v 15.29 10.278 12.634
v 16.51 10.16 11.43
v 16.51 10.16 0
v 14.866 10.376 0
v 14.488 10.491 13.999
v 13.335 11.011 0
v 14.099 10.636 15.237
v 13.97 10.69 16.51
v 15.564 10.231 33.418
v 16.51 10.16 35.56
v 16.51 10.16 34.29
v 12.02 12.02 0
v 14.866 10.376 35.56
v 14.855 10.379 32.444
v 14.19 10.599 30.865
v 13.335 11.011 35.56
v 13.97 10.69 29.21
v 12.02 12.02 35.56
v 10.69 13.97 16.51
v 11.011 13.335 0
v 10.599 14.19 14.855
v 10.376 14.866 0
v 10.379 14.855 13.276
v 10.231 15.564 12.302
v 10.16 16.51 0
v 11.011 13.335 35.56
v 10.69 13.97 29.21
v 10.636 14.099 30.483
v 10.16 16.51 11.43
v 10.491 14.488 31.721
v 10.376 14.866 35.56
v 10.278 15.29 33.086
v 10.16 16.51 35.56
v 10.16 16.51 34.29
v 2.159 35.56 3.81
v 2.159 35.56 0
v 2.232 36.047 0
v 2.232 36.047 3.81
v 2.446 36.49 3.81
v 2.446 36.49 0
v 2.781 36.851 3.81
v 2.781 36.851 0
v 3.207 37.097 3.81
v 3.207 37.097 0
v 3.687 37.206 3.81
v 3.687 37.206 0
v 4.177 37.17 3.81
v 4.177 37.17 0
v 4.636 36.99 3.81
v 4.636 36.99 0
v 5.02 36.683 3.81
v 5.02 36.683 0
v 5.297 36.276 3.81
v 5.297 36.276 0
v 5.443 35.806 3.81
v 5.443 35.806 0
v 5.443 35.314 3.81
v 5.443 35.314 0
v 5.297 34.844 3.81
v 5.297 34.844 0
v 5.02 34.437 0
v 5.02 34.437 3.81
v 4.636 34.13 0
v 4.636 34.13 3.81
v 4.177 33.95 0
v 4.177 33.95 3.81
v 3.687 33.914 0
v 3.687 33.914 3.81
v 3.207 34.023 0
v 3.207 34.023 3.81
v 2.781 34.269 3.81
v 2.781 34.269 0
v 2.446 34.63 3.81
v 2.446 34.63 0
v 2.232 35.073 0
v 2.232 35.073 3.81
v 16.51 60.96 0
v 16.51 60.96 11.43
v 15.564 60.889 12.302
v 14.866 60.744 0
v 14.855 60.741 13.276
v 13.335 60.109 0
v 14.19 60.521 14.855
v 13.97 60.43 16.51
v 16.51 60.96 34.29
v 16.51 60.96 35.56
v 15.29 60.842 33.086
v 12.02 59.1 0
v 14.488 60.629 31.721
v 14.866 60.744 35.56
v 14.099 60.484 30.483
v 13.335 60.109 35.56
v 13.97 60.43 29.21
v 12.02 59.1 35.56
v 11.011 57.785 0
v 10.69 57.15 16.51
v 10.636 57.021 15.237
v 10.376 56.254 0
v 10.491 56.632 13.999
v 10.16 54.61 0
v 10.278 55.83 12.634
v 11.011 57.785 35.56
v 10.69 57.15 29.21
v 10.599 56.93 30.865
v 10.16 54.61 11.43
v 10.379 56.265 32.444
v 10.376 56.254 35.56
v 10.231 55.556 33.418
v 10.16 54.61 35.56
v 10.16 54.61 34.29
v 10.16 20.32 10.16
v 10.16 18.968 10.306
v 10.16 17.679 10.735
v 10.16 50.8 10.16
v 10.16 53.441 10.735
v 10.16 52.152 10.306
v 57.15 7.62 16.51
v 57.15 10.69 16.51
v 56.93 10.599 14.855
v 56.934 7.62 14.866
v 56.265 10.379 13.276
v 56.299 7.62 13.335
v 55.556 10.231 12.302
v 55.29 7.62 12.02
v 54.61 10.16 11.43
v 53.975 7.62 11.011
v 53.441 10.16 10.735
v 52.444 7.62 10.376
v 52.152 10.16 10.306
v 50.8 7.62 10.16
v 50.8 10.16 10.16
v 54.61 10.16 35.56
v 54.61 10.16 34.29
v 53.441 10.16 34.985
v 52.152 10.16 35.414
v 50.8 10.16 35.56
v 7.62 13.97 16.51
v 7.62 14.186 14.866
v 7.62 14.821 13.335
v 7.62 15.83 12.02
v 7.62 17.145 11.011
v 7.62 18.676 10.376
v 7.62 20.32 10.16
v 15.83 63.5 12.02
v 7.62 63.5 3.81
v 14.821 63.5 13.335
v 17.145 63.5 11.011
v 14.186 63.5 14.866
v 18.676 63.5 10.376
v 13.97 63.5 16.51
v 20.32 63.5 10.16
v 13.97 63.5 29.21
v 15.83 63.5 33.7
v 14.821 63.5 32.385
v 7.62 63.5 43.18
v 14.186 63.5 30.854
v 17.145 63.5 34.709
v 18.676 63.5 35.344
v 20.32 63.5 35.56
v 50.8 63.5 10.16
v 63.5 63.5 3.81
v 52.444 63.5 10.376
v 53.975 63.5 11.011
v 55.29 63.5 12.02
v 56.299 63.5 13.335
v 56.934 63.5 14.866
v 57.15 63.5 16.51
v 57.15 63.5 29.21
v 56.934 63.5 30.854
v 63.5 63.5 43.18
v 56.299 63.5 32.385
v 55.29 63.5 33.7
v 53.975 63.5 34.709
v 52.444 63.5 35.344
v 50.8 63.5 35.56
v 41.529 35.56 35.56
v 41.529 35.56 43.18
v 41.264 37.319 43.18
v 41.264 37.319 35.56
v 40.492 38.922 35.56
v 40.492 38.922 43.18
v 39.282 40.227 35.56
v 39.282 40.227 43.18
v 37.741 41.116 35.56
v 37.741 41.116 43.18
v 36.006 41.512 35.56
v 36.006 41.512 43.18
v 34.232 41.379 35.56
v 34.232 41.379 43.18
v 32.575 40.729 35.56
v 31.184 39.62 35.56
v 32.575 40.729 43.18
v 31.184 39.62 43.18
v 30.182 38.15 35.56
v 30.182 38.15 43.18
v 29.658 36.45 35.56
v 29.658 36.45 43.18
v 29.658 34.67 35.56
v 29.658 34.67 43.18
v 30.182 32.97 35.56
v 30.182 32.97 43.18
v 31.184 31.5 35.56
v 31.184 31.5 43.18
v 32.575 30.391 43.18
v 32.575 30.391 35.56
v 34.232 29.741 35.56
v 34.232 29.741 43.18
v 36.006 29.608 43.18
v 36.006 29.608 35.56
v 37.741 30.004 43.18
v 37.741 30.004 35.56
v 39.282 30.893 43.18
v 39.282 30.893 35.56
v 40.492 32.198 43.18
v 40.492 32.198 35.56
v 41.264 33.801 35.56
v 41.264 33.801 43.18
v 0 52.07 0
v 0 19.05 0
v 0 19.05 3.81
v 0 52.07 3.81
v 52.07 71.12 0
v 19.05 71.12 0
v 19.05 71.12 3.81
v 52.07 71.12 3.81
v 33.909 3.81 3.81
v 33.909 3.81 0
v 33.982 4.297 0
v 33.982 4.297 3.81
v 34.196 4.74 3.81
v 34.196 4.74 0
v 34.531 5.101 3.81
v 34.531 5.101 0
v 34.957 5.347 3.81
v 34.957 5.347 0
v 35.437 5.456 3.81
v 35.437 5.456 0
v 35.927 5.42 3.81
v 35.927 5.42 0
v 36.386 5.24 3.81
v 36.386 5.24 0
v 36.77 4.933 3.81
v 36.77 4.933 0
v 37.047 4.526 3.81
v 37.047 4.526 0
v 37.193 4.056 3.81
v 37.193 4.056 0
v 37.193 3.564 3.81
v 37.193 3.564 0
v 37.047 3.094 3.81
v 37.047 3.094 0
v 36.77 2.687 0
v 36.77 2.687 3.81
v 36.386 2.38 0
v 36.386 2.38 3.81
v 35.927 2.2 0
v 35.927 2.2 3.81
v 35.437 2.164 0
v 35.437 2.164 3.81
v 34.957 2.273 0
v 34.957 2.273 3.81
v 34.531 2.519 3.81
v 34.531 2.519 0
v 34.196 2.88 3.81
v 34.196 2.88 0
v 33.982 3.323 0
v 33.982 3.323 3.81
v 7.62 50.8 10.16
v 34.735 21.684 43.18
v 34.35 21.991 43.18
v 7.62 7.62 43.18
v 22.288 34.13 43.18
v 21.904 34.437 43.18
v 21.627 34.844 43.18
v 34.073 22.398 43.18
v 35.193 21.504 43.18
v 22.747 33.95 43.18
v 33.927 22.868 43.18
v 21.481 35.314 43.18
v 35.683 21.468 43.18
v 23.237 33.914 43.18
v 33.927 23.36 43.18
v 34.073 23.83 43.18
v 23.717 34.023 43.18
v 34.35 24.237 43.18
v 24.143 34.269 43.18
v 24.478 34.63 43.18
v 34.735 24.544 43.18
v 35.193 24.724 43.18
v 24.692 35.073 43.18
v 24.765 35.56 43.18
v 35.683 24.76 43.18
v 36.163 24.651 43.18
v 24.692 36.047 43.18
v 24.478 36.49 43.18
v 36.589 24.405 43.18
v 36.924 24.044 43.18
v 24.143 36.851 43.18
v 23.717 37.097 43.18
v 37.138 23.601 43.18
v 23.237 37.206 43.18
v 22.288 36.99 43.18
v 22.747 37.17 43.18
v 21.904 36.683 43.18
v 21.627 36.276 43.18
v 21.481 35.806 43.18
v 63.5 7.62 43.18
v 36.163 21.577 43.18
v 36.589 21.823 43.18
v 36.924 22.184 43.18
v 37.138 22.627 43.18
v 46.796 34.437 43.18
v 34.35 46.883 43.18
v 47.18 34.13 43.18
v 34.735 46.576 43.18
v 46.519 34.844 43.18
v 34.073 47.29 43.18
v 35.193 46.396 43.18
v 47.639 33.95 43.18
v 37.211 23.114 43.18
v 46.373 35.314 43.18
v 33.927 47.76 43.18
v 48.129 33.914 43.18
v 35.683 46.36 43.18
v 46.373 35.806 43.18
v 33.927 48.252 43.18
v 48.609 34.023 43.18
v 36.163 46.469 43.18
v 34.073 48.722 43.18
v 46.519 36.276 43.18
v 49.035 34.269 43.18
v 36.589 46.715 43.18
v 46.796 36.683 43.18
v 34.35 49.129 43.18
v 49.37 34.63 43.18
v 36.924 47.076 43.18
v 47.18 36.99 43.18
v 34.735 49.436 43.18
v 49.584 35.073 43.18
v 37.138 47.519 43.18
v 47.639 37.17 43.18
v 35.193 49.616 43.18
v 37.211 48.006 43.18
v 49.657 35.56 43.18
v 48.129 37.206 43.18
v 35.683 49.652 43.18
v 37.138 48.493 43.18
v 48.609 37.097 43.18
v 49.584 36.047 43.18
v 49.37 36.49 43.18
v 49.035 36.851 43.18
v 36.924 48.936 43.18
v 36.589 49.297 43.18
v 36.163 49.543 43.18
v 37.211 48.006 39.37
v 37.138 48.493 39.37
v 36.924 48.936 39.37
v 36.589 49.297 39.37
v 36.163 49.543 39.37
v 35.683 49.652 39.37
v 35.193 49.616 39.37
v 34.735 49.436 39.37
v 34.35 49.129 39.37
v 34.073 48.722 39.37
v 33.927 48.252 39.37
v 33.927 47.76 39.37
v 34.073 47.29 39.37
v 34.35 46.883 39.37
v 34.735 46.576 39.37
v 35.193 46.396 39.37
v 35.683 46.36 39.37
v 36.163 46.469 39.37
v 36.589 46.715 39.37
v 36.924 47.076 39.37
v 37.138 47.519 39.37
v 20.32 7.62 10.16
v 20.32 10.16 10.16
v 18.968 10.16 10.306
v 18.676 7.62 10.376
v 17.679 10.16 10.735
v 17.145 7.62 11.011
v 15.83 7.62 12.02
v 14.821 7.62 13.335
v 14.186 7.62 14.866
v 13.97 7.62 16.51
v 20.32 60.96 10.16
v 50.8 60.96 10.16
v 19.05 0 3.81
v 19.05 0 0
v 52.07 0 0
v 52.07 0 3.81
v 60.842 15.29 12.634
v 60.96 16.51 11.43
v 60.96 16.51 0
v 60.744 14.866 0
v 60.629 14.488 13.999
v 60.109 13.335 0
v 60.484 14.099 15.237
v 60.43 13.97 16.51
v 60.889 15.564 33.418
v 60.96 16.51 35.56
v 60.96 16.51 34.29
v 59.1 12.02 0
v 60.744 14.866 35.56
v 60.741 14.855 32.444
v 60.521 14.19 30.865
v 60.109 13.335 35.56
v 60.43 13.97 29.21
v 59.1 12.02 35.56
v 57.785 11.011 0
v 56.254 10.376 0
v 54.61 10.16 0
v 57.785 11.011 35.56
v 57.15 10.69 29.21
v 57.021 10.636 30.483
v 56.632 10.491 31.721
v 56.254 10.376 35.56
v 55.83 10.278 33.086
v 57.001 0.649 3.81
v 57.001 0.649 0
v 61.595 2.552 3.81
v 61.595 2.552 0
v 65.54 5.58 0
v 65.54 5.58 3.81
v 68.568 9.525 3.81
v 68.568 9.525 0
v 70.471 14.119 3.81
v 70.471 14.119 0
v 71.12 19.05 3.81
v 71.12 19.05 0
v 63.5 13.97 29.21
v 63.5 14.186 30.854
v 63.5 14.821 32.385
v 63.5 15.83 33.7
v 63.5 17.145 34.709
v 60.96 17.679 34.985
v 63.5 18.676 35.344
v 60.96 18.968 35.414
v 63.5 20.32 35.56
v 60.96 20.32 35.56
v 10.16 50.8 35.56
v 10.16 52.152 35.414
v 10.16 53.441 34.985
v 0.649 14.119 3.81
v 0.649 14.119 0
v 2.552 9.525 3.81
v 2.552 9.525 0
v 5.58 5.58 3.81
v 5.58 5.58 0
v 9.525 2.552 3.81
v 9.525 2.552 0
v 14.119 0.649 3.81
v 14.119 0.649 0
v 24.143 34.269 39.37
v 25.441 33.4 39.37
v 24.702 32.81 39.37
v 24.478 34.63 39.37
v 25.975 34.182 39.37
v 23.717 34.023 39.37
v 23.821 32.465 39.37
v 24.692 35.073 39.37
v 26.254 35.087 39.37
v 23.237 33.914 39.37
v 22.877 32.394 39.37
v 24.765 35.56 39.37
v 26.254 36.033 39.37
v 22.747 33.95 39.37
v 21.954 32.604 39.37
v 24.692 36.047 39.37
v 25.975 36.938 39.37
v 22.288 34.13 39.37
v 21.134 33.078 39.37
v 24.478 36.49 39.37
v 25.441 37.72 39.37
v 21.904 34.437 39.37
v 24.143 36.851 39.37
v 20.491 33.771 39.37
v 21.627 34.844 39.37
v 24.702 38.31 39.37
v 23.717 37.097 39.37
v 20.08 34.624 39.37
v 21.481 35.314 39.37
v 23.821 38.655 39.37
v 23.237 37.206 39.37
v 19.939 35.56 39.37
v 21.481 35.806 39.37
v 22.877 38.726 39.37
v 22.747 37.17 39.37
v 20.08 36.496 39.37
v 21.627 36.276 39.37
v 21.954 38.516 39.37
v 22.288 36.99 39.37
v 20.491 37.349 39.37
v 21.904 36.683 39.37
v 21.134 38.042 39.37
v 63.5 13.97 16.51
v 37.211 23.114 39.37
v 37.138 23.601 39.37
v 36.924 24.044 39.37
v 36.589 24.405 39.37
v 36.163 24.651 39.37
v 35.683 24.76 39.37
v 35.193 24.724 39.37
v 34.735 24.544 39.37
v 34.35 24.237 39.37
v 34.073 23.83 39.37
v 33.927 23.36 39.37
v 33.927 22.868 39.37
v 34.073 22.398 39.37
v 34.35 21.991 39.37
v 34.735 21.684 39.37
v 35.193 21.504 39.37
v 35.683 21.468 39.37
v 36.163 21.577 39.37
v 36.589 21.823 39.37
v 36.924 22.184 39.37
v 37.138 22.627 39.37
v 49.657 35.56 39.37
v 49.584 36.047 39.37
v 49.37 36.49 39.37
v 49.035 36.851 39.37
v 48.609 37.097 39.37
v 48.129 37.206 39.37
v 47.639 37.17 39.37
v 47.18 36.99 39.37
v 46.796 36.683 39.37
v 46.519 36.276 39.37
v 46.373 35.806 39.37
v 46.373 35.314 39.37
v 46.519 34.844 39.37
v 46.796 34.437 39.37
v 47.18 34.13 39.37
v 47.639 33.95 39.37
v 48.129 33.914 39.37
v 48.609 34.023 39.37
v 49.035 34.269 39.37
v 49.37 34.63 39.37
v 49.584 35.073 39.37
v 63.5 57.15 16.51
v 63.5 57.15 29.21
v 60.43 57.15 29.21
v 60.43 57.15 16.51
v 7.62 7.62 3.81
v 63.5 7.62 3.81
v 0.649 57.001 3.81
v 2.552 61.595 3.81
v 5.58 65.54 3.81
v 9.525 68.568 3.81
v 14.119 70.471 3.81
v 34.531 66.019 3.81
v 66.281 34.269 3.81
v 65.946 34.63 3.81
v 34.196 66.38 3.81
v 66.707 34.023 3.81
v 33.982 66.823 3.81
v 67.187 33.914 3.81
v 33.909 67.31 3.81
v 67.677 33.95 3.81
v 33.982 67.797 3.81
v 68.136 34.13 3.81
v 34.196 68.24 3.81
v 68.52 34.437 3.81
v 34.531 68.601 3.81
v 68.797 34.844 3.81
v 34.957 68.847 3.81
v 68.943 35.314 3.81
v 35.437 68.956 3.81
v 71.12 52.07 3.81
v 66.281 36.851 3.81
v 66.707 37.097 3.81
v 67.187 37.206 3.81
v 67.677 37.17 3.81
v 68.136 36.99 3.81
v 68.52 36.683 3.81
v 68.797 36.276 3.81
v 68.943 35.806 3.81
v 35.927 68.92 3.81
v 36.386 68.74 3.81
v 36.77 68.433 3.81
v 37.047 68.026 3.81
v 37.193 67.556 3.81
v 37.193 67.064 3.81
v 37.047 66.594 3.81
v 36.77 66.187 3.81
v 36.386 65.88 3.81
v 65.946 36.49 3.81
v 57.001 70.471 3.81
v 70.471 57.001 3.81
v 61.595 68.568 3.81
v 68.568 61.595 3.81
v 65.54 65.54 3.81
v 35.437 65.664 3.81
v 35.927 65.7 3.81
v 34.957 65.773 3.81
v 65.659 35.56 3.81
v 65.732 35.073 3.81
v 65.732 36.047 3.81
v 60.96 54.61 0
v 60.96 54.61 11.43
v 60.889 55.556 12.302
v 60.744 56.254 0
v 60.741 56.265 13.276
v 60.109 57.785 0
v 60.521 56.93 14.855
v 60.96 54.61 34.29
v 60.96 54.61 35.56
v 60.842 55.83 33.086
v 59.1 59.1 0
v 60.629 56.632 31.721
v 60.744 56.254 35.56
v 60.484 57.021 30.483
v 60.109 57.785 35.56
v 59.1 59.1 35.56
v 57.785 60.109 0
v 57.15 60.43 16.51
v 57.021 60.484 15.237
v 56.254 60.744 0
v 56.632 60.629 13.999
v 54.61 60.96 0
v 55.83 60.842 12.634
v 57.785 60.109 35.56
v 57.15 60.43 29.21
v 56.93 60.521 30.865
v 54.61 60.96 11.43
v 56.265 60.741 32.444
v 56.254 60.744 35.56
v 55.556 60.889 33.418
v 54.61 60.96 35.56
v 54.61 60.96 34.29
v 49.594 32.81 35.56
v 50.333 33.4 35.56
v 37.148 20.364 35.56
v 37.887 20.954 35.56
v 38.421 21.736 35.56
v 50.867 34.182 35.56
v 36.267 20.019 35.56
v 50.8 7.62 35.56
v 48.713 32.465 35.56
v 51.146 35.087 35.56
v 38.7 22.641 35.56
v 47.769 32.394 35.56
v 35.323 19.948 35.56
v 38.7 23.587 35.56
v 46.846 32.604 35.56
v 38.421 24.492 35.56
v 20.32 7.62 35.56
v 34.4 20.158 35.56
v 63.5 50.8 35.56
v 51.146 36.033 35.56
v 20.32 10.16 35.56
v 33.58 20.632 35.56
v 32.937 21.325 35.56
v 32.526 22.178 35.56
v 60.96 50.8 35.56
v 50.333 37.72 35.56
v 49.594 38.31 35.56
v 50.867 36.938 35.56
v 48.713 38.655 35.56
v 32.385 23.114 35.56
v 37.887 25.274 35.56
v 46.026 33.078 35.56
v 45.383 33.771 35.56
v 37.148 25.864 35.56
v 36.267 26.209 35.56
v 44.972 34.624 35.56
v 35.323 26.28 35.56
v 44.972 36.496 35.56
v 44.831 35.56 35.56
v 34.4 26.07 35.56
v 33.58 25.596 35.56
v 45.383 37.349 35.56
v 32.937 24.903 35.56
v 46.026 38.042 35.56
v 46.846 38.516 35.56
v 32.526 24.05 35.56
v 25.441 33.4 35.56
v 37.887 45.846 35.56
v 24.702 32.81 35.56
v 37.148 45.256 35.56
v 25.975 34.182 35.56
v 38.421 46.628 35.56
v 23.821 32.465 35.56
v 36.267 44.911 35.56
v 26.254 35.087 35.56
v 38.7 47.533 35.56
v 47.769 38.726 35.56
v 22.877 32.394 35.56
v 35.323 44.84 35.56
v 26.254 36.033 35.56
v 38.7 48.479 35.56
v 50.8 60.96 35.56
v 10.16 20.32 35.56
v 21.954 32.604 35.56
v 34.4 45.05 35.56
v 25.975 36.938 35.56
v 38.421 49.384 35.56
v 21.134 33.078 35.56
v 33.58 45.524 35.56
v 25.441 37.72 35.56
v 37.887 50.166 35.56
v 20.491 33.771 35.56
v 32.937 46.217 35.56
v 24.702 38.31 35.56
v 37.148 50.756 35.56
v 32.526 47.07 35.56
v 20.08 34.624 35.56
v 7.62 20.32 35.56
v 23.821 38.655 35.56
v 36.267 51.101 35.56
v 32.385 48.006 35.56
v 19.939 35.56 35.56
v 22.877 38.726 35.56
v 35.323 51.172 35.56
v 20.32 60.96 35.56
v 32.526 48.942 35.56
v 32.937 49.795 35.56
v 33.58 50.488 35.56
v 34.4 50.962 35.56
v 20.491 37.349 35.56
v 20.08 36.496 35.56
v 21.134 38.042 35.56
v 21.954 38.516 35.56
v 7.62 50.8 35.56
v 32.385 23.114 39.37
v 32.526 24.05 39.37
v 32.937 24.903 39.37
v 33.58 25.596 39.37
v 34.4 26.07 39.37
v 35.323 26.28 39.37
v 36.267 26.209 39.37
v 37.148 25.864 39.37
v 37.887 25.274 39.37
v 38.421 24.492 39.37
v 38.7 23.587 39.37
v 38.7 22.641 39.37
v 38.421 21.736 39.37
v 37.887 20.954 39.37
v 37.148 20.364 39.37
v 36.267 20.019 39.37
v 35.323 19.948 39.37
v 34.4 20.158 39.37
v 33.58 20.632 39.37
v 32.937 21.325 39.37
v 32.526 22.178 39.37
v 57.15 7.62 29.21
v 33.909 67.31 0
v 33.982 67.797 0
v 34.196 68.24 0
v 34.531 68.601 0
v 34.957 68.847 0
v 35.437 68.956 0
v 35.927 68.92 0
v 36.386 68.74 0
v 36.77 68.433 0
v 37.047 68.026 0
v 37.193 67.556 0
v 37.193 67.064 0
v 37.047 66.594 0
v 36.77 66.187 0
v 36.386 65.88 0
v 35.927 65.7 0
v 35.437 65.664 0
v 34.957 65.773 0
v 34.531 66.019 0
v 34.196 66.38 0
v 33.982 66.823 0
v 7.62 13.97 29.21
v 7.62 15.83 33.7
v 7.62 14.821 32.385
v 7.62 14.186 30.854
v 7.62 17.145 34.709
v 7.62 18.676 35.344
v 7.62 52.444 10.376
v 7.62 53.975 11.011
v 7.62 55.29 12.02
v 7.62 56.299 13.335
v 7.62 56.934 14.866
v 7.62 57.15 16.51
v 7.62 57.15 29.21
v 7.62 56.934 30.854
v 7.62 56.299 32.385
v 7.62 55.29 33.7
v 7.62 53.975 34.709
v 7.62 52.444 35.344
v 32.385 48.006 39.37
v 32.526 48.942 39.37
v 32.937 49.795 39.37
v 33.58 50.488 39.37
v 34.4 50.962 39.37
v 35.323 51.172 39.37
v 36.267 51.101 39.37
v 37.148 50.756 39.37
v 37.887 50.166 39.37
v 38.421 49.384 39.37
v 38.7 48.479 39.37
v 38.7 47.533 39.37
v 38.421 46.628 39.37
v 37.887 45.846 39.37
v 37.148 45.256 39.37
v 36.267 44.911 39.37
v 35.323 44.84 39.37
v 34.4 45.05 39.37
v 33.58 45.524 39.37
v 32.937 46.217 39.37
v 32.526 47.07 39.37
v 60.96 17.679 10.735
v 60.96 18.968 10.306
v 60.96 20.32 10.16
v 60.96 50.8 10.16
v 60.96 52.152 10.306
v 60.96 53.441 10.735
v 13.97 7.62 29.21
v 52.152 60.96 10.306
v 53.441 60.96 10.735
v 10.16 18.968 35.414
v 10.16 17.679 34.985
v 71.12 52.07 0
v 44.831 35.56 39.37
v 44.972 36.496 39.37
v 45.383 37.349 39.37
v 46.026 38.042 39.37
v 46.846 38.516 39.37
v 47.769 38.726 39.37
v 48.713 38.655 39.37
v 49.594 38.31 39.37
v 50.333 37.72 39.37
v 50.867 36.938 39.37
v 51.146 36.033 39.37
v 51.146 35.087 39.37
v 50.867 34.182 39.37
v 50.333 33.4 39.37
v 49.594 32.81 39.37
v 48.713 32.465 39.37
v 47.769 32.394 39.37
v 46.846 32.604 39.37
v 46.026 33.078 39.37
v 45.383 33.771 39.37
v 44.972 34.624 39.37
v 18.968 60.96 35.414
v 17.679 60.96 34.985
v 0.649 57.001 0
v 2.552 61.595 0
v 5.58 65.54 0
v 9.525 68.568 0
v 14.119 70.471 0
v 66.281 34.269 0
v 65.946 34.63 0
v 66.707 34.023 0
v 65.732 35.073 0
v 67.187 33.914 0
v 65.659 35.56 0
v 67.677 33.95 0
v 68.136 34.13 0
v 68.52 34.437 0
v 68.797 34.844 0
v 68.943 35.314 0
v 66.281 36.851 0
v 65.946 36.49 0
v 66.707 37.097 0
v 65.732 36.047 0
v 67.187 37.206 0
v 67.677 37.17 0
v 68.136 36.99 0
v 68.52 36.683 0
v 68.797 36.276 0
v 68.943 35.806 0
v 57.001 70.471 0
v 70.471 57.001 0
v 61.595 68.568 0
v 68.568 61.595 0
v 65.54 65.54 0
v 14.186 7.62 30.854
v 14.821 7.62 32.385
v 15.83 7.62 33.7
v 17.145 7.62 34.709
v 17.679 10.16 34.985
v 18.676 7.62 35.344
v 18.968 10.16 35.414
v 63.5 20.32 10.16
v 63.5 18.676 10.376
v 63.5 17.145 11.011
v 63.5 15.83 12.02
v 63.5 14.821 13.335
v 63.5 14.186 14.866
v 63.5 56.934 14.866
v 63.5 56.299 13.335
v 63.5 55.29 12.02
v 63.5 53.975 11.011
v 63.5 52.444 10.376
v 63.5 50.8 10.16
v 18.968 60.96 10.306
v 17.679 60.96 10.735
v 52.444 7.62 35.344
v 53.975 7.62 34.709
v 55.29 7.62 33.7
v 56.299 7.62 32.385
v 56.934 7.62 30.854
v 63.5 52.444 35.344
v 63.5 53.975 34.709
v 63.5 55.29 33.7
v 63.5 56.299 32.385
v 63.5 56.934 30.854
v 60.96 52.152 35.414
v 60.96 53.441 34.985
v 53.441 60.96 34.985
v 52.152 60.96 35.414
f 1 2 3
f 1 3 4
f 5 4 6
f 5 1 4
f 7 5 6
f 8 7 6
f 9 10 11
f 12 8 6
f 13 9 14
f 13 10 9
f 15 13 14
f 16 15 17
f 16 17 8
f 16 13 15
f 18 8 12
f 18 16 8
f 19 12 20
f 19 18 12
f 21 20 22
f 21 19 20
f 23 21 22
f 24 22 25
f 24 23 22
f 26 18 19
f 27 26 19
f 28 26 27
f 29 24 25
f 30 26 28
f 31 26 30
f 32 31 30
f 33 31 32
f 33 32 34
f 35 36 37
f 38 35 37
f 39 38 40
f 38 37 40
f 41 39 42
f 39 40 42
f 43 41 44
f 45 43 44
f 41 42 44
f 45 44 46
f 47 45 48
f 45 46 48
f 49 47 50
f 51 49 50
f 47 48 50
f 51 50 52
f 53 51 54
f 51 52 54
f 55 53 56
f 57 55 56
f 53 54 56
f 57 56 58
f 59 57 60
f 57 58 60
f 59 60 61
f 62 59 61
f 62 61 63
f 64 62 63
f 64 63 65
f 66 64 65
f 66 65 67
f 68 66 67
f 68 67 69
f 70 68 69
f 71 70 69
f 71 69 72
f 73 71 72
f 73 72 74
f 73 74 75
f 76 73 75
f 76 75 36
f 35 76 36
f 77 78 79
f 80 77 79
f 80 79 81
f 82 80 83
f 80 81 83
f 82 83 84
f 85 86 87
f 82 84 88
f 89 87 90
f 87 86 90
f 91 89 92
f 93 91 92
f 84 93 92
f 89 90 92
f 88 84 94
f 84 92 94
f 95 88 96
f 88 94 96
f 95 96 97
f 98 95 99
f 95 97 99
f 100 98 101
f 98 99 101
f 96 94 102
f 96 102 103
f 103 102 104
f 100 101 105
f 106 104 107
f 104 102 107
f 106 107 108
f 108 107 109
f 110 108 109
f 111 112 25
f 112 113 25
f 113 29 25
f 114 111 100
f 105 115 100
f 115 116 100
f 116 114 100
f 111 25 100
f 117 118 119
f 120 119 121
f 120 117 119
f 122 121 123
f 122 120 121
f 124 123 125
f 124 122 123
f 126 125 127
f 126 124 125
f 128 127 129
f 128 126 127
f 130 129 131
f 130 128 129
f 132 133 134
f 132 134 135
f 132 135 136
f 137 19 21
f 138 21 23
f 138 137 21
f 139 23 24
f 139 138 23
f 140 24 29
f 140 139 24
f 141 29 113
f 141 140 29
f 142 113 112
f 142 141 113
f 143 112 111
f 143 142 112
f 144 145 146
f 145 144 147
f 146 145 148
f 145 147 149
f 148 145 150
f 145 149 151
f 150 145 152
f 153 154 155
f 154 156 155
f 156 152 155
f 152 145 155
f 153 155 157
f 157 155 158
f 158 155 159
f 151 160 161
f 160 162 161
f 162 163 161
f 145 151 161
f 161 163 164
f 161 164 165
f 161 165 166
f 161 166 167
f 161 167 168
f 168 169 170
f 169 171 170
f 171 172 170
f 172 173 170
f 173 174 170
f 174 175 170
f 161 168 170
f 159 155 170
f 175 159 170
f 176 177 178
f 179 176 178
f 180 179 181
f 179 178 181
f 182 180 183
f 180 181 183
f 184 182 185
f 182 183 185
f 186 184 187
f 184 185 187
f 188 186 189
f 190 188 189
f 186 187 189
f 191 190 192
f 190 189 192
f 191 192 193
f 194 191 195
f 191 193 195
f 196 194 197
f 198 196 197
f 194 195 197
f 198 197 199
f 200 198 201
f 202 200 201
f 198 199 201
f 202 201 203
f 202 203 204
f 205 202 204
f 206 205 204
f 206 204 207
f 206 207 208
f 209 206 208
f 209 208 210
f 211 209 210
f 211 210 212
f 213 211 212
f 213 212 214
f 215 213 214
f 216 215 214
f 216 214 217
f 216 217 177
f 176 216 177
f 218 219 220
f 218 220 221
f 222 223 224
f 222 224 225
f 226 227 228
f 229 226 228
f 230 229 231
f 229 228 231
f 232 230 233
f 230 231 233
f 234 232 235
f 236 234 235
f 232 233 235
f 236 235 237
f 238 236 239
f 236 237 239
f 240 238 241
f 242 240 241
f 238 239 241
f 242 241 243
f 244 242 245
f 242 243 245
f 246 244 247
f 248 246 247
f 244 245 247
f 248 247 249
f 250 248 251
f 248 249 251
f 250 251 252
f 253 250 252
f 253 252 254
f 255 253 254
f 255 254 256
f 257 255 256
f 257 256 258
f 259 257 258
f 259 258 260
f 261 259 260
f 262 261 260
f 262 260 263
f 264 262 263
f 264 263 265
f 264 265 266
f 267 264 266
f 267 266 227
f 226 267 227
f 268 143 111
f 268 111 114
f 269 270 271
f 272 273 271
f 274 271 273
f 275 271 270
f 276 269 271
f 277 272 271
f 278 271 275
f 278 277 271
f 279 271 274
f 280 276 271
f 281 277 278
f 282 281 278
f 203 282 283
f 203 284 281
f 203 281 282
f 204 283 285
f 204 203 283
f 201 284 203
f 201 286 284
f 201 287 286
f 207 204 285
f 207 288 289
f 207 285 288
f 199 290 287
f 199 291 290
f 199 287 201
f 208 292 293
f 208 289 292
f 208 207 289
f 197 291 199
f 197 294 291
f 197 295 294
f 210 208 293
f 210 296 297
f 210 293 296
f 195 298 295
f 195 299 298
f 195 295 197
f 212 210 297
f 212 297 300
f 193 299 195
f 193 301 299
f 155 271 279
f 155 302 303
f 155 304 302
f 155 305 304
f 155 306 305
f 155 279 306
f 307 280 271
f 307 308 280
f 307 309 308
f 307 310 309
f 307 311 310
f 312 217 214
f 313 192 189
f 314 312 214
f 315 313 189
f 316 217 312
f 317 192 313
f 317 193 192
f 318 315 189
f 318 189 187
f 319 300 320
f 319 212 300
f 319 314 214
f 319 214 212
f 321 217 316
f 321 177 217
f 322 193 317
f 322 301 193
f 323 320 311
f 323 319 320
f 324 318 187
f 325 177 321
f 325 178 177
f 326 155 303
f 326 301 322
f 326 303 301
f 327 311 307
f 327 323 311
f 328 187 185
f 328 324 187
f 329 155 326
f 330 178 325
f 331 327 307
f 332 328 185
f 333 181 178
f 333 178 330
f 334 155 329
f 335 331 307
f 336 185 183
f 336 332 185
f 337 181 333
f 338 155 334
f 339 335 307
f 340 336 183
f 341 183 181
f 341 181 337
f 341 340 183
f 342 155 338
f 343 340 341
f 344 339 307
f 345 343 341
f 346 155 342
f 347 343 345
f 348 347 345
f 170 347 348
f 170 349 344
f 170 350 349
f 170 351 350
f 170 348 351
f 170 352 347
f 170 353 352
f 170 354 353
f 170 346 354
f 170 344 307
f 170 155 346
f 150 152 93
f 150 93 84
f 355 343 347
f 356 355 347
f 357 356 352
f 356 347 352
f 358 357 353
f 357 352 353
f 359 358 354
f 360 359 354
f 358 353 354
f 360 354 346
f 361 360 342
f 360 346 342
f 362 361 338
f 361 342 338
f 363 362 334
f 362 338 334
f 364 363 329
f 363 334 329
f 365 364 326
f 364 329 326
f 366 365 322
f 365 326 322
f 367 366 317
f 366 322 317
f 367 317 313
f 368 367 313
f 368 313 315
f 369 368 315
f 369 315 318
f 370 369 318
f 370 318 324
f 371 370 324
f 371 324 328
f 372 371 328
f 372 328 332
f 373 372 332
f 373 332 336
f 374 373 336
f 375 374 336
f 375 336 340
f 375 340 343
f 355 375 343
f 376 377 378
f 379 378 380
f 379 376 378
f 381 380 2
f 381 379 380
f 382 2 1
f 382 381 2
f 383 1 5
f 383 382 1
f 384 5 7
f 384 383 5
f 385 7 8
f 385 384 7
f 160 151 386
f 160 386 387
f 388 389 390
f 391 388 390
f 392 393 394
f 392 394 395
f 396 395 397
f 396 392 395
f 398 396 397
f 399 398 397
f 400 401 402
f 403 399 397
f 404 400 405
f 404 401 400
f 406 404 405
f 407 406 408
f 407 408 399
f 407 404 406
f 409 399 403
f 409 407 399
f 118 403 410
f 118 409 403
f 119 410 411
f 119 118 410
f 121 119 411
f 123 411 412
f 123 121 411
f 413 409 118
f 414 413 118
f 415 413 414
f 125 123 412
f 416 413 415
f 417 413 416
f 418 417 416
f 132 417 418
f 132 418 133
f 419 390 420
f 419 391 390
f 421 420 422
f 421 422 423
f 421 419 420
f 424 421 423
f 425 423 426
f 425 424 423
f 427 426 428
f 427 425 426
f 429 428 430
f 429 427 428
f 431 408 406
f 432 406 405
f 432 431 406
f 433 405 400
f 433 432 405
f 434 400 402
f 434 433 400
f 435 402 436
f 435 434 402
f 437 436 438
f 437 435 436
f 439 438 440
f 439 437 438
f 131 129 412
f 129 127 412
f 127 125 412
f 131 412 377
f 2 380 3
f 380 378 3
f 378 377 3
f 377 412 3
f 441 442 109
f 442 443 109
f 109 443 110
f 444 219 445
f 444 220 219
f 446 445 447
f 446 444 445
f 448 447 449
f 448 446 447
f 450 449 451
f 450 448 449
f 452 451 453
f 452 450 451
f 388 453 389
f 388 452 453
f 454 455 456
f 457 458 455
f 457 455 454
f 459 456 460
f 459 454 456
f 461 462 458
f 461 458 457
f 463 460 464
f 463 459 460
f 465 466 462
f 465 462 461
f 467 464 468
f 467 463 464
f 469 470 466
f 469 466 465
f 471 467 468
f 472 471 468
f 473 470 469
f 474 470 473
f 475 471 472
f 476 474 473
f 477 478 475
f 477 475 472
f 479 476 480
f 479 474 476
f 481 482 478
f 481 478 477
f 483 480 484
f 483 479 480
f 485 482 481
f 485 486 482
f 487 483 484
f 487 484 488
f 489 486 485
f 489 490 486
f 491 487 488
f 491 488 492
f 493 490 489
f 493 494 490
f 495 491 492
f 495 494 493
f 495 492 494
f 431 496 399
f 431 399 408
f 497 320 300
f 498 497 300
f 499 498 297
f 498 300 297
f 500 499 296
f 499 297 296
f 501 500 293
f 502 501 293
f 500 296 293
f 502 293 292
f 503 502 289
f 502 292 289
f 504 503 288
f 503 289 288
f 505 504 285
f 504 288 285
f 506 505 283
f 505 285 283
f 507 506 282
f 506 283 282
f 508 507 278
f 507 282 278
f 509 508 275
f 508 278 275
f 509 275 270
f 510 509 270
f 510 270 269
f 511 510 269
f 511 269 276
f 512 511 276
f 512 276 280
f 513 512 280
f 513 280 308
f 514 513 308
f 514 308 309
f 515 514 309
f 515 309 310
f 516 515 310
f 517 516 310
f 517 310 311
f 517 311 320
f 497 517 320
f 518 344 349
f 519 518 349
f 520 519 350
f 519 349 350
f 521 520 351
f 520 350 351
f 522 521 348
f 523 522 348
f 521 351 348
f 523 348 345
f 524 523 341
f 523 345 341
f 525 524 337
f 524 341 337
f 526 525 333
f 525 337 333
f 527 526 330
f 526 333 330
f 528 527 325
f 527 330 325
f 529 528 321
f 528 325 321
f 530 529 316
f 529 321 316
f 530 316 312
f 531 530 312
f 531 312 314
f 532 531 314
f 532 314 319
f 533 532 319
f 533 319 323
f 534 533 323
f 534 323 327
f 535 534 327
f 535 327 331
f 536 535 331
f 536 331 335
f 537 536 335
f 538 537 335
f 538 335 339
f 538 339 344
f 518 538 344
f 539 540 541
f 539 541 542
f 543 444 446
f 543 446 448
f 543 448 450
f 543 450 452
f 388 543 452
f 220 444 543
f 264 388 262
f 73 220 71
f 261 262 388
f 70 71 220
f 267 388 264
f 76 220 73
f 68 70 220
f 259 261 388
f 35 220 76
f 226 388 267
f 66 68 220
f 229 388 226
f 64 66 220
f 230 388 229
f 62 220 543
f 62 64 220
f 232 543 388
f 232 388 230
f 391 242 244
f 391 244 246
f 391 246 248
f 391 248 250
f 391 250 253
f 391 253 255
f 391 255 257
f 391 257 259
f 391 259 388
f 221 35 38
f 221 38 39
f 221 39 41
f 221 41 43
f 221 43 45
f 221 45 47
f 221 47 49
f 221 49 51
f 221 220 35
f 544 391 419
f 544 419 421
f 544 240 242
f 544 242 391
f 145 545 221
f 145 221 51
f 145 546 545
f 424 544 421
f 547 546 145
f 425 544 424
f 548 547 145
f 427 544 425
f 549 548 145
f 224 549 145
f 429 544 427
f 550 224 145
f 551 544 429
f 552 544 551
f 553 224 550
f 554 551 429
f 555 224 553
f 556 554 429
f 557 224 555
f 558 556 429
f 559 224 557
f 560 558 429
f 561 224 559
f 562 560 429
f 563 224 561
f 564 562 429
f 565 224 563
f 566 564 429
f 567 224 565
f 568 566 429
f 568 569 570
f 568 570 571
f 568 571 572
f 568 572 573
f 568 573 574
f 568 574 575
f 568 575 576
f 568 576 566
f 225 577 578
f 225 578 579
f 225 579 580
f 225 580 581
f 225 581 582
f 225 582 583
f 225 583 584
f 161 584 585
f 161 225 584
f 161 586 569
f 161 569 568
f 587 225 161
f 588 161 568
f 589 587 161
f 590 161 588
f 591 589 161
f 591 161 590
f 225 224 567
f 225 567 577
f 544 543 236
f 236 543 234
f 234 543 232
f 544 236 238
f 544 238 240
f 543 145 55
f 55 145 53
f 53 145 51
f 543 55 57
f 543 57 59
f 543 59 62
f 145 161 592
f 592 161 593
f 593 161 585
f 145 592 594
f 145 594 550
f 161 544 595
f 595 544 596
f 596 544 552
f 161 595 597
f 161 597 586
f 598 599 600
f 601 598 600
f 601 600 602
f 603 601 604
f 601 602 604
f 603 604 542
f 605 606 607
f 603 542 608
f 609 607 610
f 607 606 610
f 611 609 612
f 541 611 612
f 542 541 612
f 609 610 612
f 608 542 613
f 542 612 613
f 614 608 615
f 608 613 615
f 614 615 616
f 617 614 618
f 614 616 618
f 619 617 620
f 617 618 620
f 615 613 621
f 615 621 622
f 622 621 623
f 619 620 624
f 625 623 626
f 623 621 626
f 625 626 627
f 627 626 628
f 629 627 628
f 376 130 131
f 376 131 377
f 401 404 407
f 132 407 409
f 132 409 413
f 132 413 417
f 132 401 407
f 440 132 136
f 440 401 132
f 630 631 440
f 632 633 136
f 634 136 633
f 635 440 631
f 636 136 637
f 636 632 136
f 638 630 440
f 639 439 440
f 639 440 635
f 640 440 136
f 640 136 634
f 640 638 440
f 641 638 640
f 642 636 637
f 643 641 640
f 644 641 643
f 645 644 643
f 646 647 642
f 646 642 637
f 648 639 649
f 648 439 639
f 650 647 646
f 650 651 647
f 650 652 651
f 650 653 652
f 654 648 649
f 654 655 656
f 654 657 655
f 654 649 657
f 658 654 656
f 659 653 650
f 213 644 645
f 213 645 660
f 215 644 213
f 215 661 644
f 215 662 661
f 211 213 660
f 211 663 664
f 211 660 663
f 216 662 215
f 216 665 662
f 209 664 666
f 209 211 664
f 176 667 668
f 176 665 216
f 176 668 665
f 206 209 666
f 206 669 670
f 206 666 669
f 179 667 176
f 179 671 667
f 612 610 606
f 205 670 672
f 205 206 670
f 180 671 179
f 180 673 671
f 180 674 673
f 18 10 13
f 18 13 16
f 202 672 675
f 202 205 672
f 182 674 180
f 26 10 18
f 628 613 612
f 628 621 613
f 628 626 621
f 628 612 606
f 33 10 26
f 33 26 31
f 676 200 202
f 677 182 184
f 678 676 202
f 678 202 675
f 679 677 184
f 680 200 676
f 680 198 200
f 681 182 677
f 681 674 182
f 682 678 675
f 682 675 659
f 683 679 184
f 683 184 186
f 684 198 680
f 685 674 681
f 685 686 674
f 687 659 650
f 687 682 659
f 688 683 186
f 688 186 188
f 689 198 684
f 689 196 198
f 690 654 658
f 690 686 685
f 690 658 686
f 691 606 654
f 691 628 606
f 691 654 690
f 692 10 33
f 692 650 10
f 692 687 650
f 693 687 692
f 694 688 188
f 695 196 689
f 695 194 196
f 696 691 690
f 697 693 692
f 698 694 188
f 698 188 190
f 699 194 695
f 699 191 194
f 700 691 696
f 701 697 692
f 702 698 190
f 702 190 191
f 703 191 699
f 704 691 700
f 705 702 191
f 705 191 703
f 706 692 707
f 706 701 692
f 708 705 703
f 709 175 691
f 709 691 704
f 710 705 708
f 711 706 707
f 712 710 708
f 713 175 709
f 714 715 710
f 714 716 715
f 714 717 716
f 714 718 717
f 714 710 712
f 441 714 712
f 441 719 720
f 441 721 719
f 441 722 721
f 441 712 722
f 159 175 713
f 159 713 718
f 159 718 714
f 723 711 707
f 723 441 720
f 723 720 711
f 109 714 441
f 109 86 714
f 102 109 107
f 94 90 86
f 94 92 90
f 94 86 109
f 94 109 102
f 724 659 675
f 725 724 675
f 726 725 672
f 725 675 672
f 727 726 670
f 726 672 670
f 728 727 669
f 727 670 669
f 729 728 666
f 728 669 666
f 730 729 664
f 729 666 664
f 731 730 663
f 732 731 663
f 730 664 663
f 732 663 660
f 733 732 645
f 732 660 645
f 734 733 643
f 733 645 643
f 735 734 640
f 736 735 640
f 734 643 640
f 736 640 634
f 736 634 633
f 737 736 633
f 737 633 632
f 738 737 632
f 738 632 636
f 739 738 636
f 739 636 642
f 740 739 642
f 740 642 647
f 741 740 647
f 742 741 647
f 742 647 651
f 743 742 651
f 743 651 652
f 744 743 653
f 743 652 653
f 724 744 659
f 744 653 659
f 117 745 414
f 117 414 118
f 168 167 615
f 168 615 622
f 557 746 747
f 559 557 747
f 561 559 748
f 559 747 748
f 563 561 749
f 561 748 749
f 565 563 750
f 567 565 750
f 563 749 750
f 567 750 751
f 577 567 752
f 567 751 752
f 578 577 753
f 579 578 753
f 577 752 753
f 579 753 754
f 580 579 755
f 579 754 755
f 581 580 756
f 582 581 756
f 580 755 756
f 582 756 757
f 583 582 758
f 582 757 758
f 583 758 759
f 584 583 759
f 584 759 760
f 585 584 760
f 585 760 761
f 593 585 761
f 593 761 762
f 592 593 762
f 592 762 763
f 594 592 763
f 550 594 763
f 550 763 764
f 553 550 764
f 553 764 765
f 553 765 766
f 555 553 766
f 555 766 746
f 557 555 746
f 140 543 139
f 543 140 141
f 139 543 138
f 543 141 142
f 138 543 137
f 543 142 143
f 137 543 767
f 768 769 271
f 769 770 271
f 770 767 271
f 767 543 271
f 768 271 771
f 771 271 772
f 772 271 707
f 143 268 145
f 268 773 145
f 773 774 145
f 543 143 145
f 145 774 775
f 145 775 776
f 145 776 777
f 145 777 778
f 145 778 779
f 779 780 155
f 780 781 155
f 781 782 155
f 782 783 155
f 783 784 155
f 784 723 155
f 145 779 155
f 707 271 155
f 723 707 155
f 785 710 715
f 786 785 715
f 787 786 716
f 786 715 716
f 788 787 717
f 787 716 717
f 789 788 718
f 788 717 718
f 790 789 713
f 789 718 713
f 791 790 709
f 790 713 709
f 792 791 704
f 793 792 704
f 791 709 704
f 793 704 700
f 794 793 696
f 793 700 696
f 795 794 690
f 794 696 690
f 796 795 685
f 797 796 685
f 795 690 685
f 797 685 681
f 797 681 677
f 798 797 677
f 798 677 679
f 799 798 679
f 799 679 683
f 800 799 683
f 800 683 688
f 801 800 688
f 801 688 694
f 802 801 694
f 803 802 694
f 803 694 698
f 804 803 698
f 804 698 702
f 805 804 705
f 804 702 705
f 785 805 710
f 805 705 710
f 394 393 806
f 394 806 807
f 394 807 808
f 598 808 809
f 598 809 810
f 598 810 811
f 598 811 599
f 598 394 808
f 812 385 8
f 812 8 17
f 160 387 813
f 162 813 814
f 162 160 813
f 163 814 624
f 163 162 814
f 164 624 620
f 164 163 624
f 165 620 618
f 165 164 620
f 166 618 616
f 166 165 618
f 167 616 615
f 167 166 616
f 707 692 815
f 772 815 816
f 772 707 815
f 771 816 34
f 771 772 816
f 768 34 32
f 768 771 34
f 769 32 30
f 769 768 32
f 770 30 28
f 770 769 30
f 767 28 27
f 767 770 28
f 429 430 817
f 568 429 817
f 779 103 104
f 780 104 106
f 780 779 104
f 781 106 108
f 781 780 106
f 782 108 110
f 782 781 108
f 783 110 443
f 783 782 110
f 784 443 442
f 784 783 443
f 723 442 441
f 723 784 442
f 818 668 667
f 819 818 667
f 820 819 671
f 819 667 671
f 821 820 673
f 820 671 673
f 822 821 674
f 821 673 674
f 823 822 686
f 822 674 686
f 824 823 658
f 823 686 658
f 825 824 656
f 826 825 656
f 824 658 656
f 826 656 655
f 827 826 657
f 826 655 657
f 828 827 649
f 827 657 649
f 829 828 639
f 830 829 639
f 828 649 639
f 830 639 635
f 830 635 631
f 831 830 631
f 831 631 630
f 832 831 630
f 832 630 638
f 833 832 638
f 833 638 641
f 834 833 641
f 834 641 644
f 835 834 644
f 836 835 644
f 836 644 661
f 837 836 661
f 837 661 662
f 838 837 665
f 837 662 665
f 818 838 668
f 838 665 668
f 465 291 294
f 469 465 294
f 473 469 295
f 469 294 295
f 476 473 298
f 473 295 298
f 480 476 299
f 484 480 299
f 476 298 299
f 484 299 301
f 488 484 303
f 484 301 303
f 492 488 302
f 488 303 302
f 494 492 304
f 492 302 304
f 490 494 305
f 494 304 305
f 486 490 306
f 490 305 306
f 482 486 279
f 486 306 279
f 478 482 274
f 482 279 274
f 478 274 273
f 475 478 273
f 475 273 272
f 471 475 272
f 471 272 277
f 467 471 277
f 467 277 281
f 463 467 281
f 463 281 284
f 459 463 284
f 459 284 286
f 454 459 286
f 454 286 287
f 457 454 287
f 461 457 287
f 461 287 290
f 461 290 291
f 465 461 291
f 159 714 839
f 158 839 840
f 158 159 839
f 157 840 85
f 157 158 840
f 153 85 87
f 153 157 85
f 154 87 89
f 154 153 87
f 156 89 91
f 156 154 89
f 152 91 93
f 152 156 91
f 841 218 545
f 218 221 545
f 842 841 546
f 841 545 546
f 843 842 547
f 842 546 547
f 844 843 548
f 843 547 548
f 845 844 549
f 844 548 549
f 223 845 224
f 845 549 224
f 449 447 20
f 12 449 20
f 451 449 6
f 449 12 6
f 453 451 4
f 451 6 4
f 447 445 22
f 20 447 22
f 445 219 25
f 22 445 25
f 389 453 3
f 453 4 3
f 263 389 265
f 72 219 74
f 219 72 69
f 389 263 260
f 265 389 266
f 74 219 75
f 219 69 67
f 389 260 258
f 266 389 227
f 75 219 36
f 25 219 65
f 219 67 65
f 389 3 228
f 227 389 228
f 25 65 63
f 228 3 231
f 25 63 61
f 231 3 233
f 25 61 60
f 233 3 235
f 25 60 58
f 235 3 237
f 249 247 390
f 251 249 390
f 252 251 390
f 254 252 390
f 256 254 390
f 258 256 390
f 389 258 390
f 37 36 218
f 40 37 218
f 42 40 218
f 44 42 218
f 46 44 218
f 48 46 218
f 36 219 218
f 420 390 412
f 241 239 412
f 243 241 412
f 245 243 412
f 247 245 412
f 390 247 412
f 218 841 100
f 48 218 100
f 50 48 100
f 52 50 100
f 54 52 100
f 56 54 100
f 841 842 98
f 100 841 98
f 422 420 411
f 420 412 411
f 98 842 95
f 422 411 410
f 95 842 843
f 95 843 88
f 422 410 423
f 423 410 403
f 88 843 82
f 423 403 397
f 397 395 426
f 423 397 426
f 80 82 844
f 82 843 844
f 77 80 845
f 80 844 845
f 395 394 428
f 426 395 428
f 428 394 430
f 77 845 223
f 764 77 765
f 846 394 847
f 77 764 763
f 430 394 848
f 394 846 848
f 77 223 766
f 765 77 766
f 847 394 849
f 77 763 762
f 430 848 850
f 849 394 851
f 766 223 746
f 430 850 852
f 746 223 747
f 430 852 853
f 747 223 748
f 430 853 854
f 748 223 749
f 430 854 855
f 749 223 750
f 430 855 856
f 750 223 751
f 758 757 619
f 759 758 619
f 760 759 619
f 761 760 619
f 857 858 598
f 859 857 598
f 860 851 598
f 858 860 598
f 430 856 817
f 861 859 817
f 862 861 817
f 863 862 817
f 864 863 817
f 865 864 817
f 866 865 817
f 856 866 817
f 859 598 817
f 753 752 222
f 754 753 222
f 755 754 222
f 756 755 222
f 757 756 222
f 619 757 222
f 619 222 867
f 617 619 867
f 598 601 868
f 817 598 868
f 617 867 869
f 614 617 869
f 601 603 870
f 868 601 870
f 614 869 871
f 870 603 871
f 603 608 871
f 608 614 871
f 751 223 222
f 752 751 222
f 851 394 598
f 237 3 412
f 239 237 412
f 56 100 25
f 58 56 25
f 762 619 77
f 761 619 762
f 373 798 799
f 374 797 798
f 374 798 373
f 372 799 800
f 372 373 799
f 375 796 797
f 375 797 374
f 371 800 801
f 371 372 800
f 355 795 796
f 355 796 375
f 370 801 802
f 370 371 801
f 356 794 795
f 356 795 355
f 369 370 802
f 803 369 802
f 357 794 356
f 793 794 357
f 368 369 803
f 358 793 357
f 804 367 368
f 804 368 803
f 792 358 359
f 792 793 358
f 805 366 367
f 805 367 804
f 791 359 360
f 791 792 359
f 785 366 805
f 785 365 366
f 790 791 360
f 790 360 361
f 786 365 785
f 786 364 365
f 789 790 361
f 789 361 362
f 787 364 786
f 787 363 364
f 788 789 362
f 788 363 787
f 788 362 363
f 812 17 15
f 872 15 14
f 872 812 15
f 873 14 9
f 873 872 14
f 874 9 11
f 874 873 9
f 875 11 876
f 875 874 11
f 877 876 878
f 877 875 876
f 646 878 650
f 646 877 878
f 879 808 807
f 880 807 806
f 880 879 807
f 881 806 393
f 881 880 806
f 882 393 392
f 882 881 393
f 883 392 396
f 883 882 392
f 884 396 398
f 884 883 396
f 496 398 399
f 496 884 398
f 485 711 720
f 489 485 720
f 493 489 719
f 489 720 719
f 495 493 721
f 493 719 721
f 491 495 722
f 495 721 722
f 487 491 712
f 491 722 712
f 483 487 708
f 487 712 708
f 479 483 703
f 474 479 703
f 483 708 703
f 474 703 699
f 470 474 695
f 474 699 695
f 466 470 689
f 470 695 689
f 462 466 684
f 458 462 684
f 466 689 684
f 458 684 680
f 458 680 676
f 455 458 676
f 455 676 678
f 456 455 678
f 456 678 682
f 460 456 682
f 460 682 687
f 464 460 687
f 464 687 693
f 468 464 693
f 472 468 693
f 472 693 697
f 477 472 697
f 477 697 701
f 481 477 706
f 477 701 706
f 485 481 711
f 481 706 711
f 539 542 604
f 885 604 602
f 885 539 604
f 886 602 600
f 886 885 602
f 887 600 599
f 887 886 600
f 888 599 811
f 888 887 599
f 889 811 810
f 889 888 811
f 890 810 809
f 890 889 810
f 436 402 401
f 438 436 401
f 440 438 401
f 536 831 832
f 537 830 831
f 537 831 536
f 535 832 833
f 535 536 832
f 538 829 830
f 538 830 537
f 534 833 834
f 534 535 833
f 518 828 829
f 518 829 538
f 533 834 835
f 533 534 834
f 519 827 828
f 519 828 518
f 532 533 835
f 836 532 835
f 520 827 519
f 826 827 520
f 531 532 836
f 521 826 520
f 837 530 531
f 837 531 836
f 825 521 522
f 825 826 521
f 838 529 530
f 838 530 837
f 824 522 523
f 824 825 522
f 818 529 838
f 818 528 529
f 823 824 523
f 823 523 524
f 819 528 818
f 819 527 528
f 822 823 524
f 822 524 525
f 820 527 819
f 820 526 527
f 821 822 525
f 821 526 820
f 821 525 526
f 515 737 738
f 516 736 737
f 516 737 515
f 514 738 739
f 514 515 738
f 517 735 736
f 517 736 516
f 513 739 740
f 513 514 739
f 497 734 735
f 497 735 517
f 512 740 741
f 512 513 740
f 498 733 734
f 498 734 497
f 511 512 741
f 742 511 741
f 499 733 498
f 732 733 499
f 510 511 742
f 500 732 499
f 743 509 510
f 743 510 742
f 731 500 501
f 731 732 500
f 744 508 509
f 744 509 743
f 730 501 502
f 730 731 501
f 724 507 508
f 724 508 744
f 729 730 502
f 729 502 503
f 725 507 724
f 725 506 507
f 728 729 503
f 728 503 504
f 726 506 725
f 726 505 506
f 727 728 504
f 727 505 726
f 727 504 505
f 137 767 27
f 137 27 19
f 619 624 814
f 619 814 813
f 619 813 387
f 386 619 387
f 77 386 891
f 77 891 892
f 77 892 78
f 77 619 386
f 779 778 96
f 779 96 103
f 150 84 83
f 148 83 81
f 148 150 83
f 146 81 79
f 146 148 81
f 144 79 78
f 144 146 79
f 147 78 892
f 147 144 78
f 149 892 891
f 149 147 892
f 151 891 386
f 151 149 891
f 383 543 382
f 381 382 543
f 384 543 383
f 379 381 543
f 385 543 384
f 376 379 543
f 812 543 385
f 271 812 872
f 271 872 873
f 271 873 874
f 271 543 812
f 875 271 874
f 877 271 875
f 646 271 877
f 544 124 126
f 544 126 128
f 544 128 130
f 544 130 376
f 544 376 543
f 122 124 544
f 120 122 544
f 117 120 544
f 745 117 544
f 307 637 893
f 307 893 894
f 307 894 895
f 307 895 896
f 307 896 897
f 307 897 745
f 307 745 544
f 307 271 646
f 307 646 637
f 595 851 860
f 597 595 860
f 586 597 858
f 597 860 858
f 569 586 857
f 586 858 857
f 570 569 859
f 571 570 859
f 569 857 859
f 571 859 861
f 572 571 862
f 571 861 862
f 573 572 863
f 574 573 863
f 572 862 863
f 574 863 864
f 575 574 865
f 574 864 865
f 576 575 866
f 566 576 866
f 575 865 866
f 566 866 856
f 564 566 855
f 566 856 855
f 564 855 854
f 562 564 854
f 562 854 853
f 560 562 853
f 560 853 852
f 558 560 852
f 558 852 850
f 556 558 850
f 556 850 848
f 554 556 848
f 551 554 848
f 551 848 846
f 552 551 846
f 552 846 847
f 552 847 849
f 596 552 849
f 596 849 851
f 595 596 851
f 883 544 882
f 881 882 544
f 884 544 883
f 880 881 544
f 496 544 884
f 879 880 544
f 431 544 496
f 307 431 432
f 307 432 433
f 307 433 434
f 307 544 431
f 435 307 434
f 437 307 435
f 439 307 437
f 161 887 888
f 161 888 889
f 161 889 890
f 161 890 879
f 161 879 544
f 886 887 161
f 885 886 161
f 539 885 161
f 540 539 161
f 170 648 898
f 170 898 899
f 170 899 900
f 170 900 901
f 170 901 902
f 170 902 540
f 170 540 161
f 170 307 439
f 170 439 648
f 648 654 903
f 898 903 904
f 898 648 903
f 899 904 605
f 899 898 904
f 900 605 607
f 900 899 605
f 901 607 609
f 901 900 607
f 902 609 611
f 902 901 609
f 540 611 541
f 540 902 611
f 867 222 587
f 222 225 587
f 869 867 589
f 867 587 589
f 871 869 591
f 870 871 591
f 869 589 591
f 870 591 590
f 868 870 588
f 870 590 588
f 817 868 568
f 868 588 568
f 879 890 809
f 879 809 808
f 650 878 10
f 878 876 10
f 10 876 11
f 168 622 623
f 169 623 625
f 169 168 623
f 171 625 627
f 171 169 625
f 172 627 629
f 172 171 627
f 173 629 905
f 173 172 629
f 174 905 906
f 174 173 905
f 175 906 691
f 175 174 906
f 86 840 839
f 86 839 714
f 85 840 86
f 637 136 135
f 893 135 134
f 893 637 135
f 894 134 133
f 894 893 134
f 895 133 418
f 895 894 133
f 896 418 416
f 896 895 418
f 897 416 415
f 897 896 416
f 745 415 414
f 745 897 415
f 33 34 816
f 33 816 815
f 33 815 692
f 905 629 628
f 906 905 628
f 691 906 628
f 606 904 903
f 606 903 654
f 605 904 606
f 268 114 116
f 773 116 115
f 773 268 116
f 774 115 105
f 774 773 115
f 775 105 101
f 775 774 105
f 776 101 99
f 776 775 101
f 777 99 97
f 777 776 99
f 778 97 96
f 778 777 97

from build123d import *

# Parameters (mm, degrees)
SKETCH1_W           = 71.12
SKETCH1_H           = 71.12
BOSS_EXTRUDE1_DEPTH = 43.18
SKETCH2_W           = 71.12
SKETCH2_H           = 71.12
SKETCH2_W_2         = 55.88
SKETCH2_H_2         = 55.88
CUT_EXTRUDE1_DEPTH  = 39.37
SKETCH4_W           = 50.8
SKETCH4_H           = 50.8
CUT_EXTRUDE2_DEPTH  = 35.56
CUT_EXTRUDE3_REACH  = 111.456
SKETCH5_R           = 1.651
SKETCH5_R_2         = 5.969
CUT_EXTRUDE4_REACH  = 111.456
SKETCH6_R           = 1.651
FILLET1_R           = 6.35
CUT_EXTRUDE5_REACH  = 106.665
CIRPATTERN1_COUNT   = 4
FILLET3_R           = 19.05
SKETCH8_R           = 3.175
CUT_EXTRUDE6_DEPTH  = 3.81


with BuildPart() as part:
    # Sketch1 → Boss-Extrude1 (new body)
    with BuildSketch(Plane.XY):
        with Locations((35.56, 35.56)):
            Rectangle(SKETCH1_W, SKETCH1_H)
    extrude(amount=BOSS_EXTRUDE1_DEPTH)

    # Sketch2 → Cut-Extrude1 (cut)
    with BuildSketch(Plane.XY.offset(43.18)):
        with Locations((35.56, 35.56)):
            Rectangle(SKETCH2_W, SKETCH2_H)
        with Locations((35.56, 35.56)):
            Rectangle(SKETCH2_W_2, SKETCH2_H_2, mode=Mode.SUBTRACT)
    extrude(amount=-CUT_EXTRUDE1_DEPTH, mode=Mode.SUBTRACT)

    # Sketch4 → Cut-Extrude2 (cut)
    with BuildSketch(Plane(origin=(0, 0, 0), x_dir=(-1, 0, 0), z_dir=(0, 0, -1))):
        with Locations((-35.56, 35.56)):
            Rectangle(SKETCH4_W, SKETCH4_H)
    extrude(amount=-CUT_EXTRUDE2_DEPTH, mode=Mode.SUBTRACT)

    # Sketch5 → Cut-Extrude3 (cut, up to next)
    with BuildSketch(Plane.XY.offset(43.18), mode=Mode.PRIVATE) as cut_extrude3_sk1:
        with Locations((35.56, 48.006)):
            Circle(SKETCH5_R)
    cut_extrude3_tool1 = extrude(cut_extrude3_sk1.sketch, amount=-CUT_EXTRUDE3_REACH, mode=Mode.PRIVATE) & part.part
    # Sketch5 → Cut-Extrude3 (cut, up to next)
    with BuildSketch(Plane.XY.offset(43.18), mode=Mode.PRIVATE) as cut_extrude3_sk2:
        with Locations((48.006, 35.56)):
            Circle(SKETCH5_R)
    cut_extrude3_tool2 = extrude(cut_extrude3_sk2.sketch, amount=-CUT_EXTRUDE3_REACH, mode=Mode.PRIVATE) & part.part
    # Sketch5 → Cut-Extrude3 (cut, up to next)
    with BuildSketch(Plane.XY.offset(43.18), mode=Mode.PRIVATE) as cut_extrude3_sk3:
        with Locations((35.56, 23.114)):
            Circle(SKETCH5_R)
    cut_extrude3_tool3 = extrude(cut_extrude3_sk3.sketch, amount=-CUT_EXTRUDE3_REACH, mode=Mode.PRIVATE) & part.part
    # Sketch5 → Cut-Extrude3 (cut, up to next)
    with BuildSketch(Plane.XY.offset(43.18), mode=Mode.PRIVATE) as cut_extrude3_sk4:
        with Locations((23.114, 35.56)):
            Circle(SKETCH5_R)
    cut_extrude3_tool4 = extrude(cut_extrude3_sk4.sketch, amount=-CUT_EXTRUDE3_REACH, mode=Mode.PRIVATE) & part.part
    # Sketch5 → Cut-Extrude3 (cut, up to next)
    with BuildSketch(Plane.XY.offset(43.18), mode=Mode.PRIVATE) as cut_extrude3_sk5:
        with Locations((35.56, 35.56)):
            Circle(SKETCH5_R_2)
    cut_extrude3_tool5 = extrude(cut_extrude3_sk5.sketch, amount=-CUT_EXTRUDE3_REACH, mode=Mode.PRIVATE) & part.part
    add(cut_extrude3_tool1.solids().sort_by_distance((35.56, 48.006, 43.18))[0], mode=Mode.SUBTRACT)
    add(cut_extrude3_tool2.solids().sort_by_distance((48.006, 35.56, 43.18))[0], mode=Mode.SUBTRACT)
    add(cut_extrude3_tool3.solids().sort_by_distance((35.56, 23.114, 43.18))[0], mode=Mode.SUBTRACT)
    add(cut_extrude3_tool4.solids().sort_by_distance((23.114, 35.56, 43.18))[0], mode=Mode.SUBTRACT)
    add(cut_extrude3_tool5.solids().sort_by_distance((35.56, 35.56, 43.18))[0], mode=Mode.SUBTRACT)

    # Sketch6 → Cut-Extrude4 (cut, up to next)
    with BuildSketch(Plane(origin=(0, 0, 0), x_dir=(-1, 0, 0), z_dir=(0, 0, -1)), mode=Mode.PRIVATE) as cut_extrude4_sk1:
        with Locations((-35.56, 67.31)):
            Circle(SKETCH6_R)
    cut_extrude4_tool1 = extrude(cut_extrude4_sk1.sketch, amount=-CUT_EXTRUDE4_REACH, mode=Mode.PRIVATE) & part.part
    # Sketch6 → Cut-Extrude4 (cut, up to next)
    with BuildSketch(Plane(origin=(0, 0, 0), x_dir=(-1, 0, 0), z_dir=(0, 0, -1)), mode=Mode.PRIVATE) as cut_extrude4_sk2:
        with Locations((-3.81, 35.56)):
            Circle(SKETCH6_R)
    cut_extrude4_tool2 = extrude(cut_extrude4_sk2.sketch, amount=-CUT_EXTRUDE4_REACH, mode=Mode.PRIVATE) & part.part
    # Sketch6 → Cut-Extrude4 (cut, up to next)
    with BuildSketch(Plane(origin=(0, 0, 0), x_dir=(-1, 0, 0), z_dir=(0, 0, -1)), mode=Mode.PRIVATE) as cut_extrude4_sk3:
        with Locations((-35.56, 3.81)):
            Circle(SKETCH6_R)
    cut_extrude4_tool3 = extrude(cut_extrude4_sk3.sketch, amount=-CUT_EXTRUDE4_REACH, mode=Mode.PRIVATE) & part.part
    # Sketch6 → Cut-Extrude4 (cut, up to next)
    with BuildSketch(Plane(origin=(0, 0, 0), x_dir=(-1, 0, 0), z_dir=(0, 0, -1)), mode=Mode.PRIVATE) as cut_extrude4_sk4:
        with Locations((-67.31, 35.56)):
            Circle(SKETCH6_R)
    cut_extrude4_tool4 = extrude(cut_extrude4_sk4.sketch, amount=-CUT_EXTRUDE4_REACH, mode=Mode.PRIVATE) & part.part
    add(cut_extrude4_tool1.solids().sort_by_distance((35.56, 67.31, 0))[0], mode=Mode.SUBTRACT)
    add(cut_extrude4_tool2.solids().sort_by_distance((3.81, 35.56, 0))[0], mode=Mode.SUBTRACT)
    add(cut_extrude4_tool3.solids().sort_by_distance((35.56, 3.81, 0))[0], mode=Mode.SUBTRACT)
    add(cut_extrude4_tool4.solids().sort_by_distance((67.31, 35.56, 0))[0], mode=Mode.SUBTRACT)

    # Fillet1
    fillet1_edges = [part.edges().sort_by_distance(p)[0] for p in [
        (60.96, 10.16, 17.78),
        (60.96, 60.96, 17.78),
        (10.16, 60.96, 17.78),
        (10.16, 10.16, 17.78),
    ]]
    fillet(fillet1_edges, radius=FILLET1_R)

    # Sketch7 → Cut-Extrude5 (cut, up to next)
    with BuildSketch(Plane.ZY.offset(-7.62), mode=Mode.PRIVATE) as cut_extrude5_sk1:
        with BuildLine():
            Line((10.16, 20.32), (10.16, 50.8))
            ThreePointArc((10.16, 50.8), (12.019871939, 55.290128061), (16.51, 57.15))
            Line((16.51, 57.15), (29.21, 57.15))
            ThreePointArc((29.21, 57.15), (33.700128061, 55.290128061), (35.56, 50.8))
            Line((35.56, 50.8), (35.56, 20.32))
            ThreePointArc((35.56, 20.32), (33.700128061, 15.829871939), (29.21, 13.97))
            Line((29.21, 13.97), (16.51, 13.97))
            ThreePointArc((16.51, 13.97), (12.019871939, 15.829871939), (10.16, 20.32))
        make_face()
    cut_extrude5_tool1 = extrude(cut_extrude5_sk1.sketch, amount=-CUT_EXTRUDE5_REACH, mode=Mode.PRIVATE) & part.part
    cut_extrude5 = cut_extrude5_tool1.solids().sort_by_distance((7.62, 35.56, 22.86))[0]
    add(cut_extrude5, mode=Mode.SUBTRACT)

    # CirPattern1: Cut-Extrude5 ×4 about axis
    cirpattern1_axis = Axis((35.56, 35.56, 0), (0, 0, 1))
    for i in range(1, CIRPATTERN1_COUNT):
        add(cut_extrude5.rotate(cirpattern1_axis, i * 360 / CIRPATTERN1_COUNT), mode=Mode.SUBTRACT)

    # Fillet3
    fillet3_edges = [part.edges().sort_by_distance(p)[0] for p in [
        (0, 0, 1.905),
        (0, 71.12, 1.905),
        (71.12, 71.12, 1.905),
        (71.12, 0, 1.905),
    ]]
    fillet(fillet3_edges, radius=FILLET3_R)

    # Sketch8 → Cut-Extrude6 (cut)
    with BuildSketch(Plane(origin=(0, 0, 35.56), x_dir=(-1, 0, 0), z_dir=(0, 0, -1))):
        with Locations((-35.56, 48.006)):
            Circle(SKETCH8_R)
        with Locations((-23.114, 35.56)):
            Circle(SKETCH8_R)
        with Locations((-35.56, 23.114)):
            Circle(SKETCH8_R)
        with Locations((-48.006, 35.56)):
            Circle(SKETCH8_R)
    extrude(amount=-CUT_EXTRUDE6_DEPTH, mode=Mode.SUBTRACT)


solid = part.part
